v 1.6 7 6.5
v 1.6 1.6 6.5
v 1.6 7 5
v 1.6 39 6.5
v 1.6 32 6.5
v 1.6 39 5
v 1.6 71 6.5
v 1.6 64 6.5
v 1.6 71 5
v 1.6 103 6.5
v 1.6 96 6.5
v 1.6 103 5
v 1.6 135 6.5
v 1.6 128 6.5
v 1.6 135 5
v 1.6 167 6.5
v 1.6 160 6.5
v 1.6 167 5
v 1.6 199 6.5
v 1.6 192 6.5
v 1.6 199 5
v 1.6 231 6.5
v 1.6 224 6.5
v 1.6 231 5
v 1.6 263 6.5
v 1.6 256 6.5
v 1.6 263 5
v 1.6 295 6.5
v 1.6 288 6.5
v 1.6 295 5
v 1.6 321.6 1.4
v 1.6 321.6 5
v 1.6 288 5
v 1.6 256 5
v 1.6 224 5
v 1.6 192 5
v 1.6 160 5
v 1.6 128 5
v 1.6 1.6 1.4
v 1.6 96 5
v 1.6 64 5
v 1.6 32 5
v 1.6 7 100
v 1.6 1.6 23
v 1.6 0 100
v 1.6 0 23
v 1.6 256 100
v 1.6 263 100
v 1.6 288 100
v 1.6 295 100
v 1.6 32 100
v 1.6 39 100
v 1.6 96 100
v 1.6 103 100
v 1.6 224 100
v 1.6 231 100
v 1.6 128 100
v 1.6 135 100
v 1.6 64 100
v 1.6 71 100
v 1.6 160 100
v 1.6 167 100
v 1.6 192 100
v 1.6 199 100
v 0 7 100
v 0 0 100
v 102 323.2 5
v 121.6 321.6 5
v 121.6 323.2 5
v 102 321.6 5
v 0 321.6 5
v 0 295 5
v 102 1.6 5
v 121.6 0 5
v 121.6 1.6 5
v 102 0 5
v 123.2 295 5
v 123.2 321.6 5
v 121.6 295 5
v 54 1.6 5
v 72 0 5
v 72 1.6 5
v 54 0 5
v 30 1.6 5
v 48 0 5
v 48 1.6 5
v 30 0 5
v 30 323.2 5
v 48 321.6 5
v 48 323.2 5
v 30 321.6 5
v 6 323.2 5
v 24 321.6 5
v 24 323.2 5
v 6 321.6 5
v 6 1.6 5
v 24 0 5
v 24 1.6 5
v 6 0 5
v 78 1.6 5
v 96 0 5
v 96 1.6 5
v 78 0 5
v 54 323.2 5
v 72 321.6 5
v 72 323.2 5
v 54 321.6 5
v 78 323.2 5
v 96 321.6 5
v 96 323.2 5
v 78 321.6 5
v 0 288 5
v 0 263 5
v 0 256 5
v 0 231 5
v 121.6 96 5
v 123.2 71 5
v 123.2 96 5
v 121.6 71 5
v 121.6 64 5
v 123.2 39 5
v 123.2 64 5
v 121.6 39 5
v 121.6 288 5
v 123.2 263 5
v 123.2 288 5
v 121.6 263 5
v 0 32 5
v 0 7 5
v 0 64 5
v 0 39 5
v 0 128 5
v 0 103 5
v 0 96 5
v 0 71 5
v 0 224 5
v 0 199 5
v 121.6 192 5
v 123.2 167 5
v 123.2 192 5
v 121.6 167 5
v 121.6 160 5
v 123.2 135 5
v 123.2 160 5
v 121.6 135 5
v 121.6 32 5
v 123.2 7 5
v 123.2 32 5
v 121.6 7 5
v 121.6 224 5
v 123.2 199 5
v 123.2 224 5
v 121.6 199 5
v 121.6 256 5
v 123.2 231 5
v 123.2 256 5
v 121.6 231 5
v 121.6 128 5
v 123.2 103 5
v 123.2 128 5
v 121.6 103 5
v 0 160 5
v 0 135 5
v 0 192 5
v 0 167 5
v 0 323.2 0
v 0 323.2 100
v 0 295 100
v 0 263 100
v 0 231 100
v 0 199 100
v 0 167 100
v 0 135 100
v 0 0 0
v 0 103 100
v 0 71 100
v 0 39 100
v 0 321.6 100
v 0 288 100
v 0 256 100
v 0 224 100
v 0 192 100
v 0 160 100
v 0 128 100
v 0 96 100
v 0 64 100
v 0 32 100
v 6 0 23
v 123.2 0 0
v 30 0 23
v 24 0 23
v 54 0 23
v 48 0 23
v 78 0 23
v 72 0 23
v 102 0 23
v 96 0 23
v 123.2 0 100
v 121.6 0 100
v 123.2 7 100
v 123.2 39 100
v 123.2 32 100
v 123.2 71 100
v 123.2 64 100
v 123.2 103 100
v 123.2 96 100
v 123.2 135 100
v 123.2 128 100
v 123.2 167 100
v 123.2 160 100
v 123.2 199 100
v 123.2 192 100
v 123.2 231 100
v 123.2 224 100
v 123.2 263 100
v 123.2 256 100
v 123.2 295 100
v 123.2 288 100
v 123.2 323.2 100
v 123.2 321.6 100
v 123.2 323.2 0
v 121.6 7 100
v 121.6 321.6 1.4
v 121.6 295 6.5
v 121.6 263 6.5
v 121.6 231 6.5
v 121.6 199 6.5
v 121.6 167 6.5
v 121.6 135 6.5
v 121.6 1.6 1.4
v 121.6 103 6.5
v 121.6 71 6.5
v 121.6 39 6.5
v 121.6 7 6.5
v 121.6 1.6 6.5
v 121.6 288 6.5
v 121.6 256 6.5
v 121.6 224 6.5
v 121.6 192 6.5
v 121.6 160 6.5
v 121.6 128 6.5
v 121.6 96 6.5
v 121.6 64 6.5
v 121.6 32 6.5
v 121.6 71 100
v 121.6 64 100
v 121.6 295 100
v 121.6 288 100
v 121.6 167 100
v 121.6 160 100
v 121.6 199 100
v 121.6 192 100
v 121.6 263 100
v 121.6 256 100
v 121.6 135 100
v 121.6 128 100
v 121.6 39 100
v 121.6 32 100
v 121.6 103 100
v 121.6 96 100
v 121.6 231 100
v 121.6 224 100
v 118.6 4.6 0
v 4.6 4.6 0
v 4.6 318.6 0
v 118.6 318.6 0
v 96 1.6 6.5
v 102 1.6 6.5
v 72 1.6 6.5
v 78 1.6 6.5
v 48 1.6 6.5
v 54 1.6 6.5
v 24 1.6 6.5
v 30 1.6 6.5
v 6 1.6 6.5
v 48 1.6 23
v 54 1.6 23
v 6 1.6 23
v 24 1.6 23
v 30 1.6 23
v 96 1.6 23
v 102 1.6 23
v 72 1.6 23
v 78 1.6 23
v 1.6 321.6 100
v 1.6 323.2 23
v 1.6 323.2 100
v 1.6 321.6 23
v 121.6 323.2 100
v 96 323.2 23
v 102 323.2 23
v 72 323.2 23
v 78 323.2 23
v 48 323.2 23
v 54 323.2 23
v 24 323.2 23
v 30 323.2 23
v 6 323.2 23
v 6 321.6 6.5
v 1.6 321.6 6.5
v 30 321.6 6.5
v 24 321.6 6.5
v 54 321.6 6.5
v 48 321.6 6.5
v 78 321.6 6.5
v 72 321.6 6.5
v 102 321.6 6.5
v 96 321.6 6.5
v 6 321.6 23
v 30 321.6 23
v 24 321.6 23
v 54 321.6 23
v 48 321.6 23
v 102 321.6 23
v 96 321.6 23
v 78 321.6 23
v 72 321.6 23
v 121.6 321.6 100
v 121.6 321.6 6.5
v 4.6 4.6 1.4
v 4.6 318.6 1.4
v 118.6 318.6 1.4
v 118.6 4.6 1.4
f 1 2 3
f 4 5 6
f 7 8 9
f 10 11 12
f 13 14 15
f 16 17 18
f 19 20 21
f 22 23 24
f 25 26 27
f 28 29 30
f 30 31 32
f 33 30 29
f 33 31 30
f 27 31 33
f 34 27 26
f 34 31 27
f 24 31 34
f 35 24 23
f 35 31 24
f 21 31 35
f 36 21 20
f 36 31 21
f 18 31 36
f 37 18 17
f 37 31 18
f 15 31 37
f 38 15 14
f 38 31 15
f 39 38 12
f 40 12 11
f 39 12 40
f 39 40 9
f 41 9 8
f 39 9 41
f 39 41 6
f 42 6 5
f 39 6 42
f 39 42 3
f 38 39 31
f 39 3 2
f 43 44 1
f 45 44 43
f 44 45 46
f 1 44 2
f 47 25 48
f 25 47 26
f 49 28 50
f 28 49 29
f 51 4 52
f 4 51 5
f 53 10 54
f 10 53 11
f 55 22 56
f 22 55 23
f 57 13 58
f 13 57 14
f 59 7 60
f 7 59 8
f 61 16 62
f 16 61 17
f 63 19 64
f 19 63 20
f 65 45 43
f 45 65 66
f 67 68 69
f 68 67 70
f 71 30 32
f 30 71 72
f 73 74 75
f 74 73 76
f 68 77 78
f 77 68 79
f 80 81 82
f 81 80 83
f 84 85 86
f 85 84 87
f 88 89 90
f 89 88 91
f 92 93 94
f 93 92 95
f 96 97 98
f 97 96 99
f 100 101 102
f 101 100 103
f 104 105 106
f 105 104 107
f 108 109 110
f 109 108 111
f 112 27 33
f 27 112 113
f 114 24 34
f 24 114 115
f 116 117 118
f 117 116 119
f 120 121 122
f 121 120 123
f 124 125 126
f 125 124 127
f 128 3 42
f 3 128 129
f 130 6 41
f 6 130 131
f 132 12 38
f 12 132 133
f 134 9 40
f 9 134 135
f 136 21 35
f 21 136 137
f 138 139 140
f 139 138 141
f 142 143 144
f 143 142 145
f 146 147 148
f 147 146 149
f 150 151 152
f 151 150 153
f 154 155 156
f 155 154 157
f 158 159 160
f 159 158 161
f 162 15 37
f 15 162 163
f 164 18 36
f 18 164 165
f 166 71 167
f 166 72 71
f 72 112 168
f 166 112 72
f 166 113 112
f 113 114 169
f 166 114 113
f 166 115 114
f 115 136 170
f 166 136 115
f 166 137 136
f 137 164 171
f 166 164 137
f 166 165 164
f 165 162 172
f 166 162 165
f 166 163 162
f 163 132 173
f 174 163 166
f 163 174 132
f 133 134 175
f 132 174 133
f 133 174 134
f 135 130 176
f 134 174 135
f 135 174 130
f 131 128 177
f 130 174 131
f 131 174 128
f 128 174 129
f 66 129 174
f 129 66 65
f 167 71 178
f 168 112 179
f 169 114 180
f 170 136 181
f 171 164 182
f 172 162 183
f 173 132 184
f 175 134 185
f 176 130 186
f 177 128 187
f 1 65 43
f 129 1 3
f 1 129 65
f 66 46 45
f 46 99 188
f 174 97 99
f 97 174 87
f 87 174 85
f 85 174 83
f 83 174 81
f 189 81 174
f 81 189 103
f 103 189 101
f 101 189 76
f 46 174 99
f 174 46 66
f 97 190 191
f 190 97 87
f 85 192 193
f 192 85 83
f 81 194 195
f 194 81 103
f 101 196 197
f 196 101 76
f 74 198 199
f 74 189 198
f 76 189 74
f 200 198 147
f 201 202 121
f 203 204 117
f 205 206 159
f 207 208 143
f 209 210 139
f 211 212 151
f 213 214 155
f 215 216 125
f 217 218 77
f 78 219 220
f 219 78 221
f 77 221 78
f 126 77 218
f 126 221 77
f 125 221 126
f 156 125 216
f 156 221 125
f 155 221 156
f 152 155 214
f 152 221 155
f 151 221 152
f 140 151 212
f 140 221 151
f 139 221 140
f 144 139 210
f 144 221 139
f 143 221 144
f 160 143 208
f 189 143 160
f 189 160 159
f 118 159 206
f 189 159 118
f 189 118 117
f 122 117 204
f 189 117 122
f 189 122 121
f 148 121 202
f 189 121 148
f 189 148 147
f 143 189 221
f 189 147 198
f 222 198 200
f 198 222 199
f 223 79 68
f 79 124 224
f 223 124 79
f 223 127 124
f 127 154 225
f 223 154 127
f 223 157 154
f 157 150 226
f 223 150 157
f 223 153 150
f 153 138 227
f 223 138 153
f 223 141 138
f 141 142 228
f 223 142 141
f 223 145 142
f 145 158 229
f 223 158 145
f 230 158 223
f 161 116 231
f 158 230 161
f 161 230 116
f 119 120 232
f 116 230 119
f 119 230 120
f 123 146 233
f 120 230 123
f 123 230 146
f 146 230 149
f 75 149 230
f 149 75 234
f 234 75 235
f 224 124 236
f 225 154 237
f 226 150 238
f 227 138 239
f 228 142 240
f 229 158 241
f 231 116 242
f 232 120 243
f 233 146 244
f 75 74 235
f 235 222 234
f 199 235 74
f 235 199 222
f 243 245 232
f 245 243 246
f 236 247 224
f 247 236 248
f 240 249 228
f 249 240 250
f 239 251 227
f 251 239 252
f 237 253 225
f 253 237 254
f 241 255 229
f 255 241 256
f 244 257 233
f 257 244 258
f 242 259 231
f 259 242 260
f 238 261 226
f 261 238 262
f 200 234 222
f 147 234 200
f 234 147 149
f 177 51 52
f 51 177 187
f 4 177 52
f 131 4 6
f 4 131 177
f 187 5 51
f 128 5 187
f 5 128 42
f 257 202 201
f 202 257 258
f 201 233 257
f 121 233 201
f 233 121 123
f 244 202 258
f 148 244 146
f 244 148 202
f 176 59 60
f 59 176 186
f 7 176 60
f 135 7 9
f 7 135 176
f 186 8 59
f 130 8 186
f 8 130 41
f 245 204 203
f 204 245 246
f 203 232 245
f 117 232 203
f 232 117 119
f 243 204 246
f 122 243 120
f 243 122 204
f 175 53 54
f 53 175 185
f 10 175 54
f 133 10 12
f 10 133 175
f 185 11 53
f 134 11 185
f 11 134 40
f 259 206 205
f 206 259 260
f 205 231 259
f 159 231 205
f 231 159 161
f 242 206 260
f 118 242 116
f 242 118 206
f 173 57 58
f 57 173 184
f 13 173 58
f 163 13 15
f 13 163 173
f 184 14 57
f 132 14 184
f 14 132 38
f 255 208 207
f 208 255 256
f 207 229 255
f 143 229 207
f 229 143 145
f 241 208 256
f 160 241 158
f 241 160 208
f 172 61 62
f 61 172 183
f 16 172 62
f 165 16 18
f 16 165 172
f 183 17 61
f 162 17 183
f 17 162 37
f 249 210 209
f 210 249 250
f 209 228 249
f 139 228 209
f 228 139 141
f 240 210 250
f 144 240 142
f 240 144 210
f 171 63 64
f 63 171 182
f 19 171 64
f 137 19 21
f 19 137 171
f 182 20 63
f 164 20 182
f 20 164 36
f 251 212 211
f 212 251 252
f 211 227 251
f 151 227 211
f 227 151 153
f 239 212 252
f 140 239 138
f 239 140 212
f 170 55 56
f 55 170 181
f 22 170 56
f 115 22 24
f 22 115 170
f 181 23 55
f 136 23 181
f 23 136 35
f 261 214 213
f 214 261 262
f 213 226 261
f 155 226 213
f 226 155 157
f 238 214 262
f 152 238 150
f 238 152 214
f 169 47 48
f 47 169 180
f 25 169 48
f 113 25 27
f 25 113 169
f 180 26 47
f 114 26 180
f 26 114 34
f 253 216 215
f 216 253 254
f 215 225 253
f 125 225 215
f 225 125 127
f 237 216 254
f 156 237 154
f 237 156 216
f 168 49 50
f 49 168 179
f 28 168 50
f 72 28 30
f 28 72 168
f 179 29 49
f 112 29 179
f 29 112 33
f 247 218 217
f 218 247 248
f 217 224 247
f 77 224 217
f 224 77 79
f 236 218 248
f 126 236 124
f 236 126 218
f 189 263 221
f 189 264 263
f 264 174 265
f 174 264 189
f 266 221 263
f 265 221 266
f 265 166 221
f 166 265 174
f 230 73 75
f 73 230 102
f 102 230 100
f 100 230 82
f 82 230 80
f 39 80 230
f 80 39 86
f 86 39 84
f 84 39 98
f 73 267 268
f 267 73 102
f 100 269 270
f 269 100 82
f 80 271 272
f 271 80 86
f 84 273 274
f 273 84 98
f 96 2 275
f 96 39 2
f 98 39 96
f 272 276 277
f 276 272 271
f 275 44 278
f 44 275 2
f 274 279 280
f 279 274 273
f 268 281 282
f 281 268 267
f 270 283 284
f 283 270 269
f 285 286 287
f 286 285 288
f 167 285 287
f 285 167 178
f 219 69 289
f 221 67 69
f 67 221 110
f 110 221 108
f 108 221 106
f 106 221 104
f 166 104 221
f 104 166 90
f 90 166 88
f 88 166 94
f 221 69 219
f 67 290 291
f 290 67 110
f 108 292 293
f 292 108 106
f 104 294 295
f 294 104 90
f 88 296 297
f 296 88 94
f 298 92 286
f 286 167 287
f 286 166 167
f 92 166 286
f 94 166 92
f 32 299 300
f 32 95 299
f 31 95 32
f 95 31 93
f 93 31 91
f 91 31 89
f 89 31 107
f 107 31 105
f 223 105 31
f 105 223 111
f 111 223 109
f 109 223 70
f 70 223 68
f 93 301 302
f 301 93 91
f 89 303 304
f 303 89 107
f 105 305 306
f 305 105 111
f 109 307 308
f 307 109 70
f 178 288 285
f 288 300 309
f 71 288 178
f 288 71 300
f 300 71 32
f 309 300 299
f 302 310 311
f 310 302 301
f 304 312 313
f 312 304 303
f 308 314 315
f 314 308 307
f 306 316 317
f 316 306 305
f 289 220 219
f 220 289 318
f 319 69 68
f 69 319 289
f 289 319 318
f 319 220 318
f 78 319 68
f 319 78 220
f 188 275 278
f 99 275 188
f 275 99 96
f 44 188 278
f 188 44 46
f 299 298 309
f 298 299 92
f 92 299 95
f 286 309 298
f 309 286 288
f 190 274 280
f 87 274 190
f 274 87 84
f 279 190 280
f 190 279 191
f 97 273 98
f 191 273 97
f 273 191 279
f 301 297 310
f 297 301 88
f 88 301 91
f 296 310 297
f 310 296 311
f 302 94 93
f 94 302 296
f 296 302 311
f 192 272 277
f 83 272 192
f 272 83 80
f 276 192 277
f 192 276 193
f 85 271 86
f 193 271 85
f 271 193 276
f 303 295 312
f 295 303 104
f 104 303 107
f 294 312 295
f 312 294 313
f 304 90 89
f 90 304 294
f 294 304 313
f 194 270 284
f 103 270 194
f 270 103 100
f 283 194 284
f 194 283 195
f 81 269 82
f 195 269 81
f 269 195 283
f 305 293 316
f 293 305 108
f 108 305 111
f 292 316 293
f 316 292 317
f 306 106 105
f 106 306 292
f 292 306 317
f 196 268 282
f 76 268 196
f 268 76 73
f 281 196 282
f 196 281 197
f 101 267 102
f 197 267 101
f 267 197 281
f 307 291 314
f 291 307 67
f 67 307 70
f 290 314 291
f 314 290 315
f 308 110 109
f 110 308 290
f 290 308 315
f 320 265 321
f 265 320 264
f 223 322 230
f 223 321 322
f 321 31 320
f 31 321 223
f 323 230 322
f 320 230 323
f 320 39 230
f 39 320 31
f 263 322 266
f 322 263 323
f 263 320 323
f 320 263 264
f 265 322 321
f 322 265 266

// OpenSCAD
/* GetCigar L drawer v0.1 FIT-CHECK. Units mm. PETG, 0.4mm nozzle.
   EXPERIMENTAL: open-top channels are NOT captive and have no load rating.
   Printed rails must not support a fully extended loaded drawer. */
part = "drawer"; // drawer, bottom, runner, guide, runner_test, guide_test, spacer, all_preview
inside_w=120; inside_d=320; inside_h=100;
wall=1.6; floor_t=1.2;
body_w=inside_w+2*wall; body_d=inside_d+2*wall;
runner_w=9; runner_h=3; runner_len=315;
guide_w=13; guide_h=6; guide_len=310; guide_base=1.8; guide_wall=1.5;
mount_y=[24,161,299];
$fn=24;
module box(x,y,z){cube([x,y,z]);}
module drawer(){
  difference(){
    union(){
      cube([body_w,body_d,5]);
      // vertical comb on the sides: each rib rises from the base without bridging
      for (y=[0:32:body_d-8]) {
        translate([0,y,5]) box(wall,7,inside_h-5);
        translate([body_w-wall,y,5]) box(wall,7,inside_h-5);
      }
      for(x=[0,body_w-wall]) for(y=[0,body_d-wall])
        translate([x,y,0])box(wall,wall,inside_h);
      // front/back ribs: no horizontal overhead lip
      for(x=[0:24:body_w-6]) {
        translate([x,0,5])box(6,wall,18);
        translate([x,body_d-wall,5])box(6,wall,18);
      }
      // pads for M3 fixing: correct external mounting footprint
      for (x=[4,body_w-12]) for(y=mount_y)
         translate([x,y-8,0])box(8,16,6);
    }
    translate([wall,wall,-0.5]) box(inside_w,inside_d,7);
    for (x=[8,body_w-8]) for(y=mount_y)
      translate([x,y,-1]) cylinder(d=3.3,h=9);
  }
  // shallow internal ledges for the separate printed base plate
  translate([wall,wall,0])box(3,inside_d,1.4);
  translate([body_w-wall-3,wall,0])box(3,inside_d,1.4);
  translate([wall,wall,0])box(inside_w,3,1.4);
  translate([wall,body_d-wall-3,0])box(inside_w,3,1.4);
}
module bottom(){
  w=inside_w-0.8; d=inside_d-0.8;
  union(){
    box(w,2.4,floor_t);
    translate([0,d-2.4,0])box(w,2.4,floor_t);
    box(2.4,d,floor_t);
    translate([w-2.4,0,0])box(2.4,d,floor_t);
    for(y=[20:32:d-10])translate([0,y,0])box(w,2,floor_t);
    for(x=[21:24:w-10])translate([x,0,0])box(2,d,floor_t);
  }
}
module runner(l=runner_len){
  difference(){
    box(runner_w,l,runner_h);
    for(y=mount_y) if(y<l-5){
      translate([runner_w/2,y,-1])cylinder(d=3.3,h=runner_h+2);
      translate([runner_w/2,y,-0.01])cylinder(d1=6.4,d2=3.3,h=1.9);
    }
  }
}
module guide(l=guide_len){
  union(){
    box(guide_w,l,guide_base);
    box(guide_wall,l,guide_h);
    translate([guide_w-guide_wall,0,0])box(guide_wall,l,guide_h);
  }
}
module spacer(){box(9,38,3);}
if(part=="drawer")drawer();
else if(part=="bottom")bottom();
else if(part=="runner")runner();
else if(part=="guide")guide();
else if(part=="runner_test")runner(55);
else if(part=="guide_test")guide(65);
else if(part=="spacer")spacer();
else if(part=="all_preview"){
 drawer();
 translate([body_w+18,0,0])bottom();
 translate([body_w+160,0,0])runner();
 translate([body_w+180,0,0])guide();
}
